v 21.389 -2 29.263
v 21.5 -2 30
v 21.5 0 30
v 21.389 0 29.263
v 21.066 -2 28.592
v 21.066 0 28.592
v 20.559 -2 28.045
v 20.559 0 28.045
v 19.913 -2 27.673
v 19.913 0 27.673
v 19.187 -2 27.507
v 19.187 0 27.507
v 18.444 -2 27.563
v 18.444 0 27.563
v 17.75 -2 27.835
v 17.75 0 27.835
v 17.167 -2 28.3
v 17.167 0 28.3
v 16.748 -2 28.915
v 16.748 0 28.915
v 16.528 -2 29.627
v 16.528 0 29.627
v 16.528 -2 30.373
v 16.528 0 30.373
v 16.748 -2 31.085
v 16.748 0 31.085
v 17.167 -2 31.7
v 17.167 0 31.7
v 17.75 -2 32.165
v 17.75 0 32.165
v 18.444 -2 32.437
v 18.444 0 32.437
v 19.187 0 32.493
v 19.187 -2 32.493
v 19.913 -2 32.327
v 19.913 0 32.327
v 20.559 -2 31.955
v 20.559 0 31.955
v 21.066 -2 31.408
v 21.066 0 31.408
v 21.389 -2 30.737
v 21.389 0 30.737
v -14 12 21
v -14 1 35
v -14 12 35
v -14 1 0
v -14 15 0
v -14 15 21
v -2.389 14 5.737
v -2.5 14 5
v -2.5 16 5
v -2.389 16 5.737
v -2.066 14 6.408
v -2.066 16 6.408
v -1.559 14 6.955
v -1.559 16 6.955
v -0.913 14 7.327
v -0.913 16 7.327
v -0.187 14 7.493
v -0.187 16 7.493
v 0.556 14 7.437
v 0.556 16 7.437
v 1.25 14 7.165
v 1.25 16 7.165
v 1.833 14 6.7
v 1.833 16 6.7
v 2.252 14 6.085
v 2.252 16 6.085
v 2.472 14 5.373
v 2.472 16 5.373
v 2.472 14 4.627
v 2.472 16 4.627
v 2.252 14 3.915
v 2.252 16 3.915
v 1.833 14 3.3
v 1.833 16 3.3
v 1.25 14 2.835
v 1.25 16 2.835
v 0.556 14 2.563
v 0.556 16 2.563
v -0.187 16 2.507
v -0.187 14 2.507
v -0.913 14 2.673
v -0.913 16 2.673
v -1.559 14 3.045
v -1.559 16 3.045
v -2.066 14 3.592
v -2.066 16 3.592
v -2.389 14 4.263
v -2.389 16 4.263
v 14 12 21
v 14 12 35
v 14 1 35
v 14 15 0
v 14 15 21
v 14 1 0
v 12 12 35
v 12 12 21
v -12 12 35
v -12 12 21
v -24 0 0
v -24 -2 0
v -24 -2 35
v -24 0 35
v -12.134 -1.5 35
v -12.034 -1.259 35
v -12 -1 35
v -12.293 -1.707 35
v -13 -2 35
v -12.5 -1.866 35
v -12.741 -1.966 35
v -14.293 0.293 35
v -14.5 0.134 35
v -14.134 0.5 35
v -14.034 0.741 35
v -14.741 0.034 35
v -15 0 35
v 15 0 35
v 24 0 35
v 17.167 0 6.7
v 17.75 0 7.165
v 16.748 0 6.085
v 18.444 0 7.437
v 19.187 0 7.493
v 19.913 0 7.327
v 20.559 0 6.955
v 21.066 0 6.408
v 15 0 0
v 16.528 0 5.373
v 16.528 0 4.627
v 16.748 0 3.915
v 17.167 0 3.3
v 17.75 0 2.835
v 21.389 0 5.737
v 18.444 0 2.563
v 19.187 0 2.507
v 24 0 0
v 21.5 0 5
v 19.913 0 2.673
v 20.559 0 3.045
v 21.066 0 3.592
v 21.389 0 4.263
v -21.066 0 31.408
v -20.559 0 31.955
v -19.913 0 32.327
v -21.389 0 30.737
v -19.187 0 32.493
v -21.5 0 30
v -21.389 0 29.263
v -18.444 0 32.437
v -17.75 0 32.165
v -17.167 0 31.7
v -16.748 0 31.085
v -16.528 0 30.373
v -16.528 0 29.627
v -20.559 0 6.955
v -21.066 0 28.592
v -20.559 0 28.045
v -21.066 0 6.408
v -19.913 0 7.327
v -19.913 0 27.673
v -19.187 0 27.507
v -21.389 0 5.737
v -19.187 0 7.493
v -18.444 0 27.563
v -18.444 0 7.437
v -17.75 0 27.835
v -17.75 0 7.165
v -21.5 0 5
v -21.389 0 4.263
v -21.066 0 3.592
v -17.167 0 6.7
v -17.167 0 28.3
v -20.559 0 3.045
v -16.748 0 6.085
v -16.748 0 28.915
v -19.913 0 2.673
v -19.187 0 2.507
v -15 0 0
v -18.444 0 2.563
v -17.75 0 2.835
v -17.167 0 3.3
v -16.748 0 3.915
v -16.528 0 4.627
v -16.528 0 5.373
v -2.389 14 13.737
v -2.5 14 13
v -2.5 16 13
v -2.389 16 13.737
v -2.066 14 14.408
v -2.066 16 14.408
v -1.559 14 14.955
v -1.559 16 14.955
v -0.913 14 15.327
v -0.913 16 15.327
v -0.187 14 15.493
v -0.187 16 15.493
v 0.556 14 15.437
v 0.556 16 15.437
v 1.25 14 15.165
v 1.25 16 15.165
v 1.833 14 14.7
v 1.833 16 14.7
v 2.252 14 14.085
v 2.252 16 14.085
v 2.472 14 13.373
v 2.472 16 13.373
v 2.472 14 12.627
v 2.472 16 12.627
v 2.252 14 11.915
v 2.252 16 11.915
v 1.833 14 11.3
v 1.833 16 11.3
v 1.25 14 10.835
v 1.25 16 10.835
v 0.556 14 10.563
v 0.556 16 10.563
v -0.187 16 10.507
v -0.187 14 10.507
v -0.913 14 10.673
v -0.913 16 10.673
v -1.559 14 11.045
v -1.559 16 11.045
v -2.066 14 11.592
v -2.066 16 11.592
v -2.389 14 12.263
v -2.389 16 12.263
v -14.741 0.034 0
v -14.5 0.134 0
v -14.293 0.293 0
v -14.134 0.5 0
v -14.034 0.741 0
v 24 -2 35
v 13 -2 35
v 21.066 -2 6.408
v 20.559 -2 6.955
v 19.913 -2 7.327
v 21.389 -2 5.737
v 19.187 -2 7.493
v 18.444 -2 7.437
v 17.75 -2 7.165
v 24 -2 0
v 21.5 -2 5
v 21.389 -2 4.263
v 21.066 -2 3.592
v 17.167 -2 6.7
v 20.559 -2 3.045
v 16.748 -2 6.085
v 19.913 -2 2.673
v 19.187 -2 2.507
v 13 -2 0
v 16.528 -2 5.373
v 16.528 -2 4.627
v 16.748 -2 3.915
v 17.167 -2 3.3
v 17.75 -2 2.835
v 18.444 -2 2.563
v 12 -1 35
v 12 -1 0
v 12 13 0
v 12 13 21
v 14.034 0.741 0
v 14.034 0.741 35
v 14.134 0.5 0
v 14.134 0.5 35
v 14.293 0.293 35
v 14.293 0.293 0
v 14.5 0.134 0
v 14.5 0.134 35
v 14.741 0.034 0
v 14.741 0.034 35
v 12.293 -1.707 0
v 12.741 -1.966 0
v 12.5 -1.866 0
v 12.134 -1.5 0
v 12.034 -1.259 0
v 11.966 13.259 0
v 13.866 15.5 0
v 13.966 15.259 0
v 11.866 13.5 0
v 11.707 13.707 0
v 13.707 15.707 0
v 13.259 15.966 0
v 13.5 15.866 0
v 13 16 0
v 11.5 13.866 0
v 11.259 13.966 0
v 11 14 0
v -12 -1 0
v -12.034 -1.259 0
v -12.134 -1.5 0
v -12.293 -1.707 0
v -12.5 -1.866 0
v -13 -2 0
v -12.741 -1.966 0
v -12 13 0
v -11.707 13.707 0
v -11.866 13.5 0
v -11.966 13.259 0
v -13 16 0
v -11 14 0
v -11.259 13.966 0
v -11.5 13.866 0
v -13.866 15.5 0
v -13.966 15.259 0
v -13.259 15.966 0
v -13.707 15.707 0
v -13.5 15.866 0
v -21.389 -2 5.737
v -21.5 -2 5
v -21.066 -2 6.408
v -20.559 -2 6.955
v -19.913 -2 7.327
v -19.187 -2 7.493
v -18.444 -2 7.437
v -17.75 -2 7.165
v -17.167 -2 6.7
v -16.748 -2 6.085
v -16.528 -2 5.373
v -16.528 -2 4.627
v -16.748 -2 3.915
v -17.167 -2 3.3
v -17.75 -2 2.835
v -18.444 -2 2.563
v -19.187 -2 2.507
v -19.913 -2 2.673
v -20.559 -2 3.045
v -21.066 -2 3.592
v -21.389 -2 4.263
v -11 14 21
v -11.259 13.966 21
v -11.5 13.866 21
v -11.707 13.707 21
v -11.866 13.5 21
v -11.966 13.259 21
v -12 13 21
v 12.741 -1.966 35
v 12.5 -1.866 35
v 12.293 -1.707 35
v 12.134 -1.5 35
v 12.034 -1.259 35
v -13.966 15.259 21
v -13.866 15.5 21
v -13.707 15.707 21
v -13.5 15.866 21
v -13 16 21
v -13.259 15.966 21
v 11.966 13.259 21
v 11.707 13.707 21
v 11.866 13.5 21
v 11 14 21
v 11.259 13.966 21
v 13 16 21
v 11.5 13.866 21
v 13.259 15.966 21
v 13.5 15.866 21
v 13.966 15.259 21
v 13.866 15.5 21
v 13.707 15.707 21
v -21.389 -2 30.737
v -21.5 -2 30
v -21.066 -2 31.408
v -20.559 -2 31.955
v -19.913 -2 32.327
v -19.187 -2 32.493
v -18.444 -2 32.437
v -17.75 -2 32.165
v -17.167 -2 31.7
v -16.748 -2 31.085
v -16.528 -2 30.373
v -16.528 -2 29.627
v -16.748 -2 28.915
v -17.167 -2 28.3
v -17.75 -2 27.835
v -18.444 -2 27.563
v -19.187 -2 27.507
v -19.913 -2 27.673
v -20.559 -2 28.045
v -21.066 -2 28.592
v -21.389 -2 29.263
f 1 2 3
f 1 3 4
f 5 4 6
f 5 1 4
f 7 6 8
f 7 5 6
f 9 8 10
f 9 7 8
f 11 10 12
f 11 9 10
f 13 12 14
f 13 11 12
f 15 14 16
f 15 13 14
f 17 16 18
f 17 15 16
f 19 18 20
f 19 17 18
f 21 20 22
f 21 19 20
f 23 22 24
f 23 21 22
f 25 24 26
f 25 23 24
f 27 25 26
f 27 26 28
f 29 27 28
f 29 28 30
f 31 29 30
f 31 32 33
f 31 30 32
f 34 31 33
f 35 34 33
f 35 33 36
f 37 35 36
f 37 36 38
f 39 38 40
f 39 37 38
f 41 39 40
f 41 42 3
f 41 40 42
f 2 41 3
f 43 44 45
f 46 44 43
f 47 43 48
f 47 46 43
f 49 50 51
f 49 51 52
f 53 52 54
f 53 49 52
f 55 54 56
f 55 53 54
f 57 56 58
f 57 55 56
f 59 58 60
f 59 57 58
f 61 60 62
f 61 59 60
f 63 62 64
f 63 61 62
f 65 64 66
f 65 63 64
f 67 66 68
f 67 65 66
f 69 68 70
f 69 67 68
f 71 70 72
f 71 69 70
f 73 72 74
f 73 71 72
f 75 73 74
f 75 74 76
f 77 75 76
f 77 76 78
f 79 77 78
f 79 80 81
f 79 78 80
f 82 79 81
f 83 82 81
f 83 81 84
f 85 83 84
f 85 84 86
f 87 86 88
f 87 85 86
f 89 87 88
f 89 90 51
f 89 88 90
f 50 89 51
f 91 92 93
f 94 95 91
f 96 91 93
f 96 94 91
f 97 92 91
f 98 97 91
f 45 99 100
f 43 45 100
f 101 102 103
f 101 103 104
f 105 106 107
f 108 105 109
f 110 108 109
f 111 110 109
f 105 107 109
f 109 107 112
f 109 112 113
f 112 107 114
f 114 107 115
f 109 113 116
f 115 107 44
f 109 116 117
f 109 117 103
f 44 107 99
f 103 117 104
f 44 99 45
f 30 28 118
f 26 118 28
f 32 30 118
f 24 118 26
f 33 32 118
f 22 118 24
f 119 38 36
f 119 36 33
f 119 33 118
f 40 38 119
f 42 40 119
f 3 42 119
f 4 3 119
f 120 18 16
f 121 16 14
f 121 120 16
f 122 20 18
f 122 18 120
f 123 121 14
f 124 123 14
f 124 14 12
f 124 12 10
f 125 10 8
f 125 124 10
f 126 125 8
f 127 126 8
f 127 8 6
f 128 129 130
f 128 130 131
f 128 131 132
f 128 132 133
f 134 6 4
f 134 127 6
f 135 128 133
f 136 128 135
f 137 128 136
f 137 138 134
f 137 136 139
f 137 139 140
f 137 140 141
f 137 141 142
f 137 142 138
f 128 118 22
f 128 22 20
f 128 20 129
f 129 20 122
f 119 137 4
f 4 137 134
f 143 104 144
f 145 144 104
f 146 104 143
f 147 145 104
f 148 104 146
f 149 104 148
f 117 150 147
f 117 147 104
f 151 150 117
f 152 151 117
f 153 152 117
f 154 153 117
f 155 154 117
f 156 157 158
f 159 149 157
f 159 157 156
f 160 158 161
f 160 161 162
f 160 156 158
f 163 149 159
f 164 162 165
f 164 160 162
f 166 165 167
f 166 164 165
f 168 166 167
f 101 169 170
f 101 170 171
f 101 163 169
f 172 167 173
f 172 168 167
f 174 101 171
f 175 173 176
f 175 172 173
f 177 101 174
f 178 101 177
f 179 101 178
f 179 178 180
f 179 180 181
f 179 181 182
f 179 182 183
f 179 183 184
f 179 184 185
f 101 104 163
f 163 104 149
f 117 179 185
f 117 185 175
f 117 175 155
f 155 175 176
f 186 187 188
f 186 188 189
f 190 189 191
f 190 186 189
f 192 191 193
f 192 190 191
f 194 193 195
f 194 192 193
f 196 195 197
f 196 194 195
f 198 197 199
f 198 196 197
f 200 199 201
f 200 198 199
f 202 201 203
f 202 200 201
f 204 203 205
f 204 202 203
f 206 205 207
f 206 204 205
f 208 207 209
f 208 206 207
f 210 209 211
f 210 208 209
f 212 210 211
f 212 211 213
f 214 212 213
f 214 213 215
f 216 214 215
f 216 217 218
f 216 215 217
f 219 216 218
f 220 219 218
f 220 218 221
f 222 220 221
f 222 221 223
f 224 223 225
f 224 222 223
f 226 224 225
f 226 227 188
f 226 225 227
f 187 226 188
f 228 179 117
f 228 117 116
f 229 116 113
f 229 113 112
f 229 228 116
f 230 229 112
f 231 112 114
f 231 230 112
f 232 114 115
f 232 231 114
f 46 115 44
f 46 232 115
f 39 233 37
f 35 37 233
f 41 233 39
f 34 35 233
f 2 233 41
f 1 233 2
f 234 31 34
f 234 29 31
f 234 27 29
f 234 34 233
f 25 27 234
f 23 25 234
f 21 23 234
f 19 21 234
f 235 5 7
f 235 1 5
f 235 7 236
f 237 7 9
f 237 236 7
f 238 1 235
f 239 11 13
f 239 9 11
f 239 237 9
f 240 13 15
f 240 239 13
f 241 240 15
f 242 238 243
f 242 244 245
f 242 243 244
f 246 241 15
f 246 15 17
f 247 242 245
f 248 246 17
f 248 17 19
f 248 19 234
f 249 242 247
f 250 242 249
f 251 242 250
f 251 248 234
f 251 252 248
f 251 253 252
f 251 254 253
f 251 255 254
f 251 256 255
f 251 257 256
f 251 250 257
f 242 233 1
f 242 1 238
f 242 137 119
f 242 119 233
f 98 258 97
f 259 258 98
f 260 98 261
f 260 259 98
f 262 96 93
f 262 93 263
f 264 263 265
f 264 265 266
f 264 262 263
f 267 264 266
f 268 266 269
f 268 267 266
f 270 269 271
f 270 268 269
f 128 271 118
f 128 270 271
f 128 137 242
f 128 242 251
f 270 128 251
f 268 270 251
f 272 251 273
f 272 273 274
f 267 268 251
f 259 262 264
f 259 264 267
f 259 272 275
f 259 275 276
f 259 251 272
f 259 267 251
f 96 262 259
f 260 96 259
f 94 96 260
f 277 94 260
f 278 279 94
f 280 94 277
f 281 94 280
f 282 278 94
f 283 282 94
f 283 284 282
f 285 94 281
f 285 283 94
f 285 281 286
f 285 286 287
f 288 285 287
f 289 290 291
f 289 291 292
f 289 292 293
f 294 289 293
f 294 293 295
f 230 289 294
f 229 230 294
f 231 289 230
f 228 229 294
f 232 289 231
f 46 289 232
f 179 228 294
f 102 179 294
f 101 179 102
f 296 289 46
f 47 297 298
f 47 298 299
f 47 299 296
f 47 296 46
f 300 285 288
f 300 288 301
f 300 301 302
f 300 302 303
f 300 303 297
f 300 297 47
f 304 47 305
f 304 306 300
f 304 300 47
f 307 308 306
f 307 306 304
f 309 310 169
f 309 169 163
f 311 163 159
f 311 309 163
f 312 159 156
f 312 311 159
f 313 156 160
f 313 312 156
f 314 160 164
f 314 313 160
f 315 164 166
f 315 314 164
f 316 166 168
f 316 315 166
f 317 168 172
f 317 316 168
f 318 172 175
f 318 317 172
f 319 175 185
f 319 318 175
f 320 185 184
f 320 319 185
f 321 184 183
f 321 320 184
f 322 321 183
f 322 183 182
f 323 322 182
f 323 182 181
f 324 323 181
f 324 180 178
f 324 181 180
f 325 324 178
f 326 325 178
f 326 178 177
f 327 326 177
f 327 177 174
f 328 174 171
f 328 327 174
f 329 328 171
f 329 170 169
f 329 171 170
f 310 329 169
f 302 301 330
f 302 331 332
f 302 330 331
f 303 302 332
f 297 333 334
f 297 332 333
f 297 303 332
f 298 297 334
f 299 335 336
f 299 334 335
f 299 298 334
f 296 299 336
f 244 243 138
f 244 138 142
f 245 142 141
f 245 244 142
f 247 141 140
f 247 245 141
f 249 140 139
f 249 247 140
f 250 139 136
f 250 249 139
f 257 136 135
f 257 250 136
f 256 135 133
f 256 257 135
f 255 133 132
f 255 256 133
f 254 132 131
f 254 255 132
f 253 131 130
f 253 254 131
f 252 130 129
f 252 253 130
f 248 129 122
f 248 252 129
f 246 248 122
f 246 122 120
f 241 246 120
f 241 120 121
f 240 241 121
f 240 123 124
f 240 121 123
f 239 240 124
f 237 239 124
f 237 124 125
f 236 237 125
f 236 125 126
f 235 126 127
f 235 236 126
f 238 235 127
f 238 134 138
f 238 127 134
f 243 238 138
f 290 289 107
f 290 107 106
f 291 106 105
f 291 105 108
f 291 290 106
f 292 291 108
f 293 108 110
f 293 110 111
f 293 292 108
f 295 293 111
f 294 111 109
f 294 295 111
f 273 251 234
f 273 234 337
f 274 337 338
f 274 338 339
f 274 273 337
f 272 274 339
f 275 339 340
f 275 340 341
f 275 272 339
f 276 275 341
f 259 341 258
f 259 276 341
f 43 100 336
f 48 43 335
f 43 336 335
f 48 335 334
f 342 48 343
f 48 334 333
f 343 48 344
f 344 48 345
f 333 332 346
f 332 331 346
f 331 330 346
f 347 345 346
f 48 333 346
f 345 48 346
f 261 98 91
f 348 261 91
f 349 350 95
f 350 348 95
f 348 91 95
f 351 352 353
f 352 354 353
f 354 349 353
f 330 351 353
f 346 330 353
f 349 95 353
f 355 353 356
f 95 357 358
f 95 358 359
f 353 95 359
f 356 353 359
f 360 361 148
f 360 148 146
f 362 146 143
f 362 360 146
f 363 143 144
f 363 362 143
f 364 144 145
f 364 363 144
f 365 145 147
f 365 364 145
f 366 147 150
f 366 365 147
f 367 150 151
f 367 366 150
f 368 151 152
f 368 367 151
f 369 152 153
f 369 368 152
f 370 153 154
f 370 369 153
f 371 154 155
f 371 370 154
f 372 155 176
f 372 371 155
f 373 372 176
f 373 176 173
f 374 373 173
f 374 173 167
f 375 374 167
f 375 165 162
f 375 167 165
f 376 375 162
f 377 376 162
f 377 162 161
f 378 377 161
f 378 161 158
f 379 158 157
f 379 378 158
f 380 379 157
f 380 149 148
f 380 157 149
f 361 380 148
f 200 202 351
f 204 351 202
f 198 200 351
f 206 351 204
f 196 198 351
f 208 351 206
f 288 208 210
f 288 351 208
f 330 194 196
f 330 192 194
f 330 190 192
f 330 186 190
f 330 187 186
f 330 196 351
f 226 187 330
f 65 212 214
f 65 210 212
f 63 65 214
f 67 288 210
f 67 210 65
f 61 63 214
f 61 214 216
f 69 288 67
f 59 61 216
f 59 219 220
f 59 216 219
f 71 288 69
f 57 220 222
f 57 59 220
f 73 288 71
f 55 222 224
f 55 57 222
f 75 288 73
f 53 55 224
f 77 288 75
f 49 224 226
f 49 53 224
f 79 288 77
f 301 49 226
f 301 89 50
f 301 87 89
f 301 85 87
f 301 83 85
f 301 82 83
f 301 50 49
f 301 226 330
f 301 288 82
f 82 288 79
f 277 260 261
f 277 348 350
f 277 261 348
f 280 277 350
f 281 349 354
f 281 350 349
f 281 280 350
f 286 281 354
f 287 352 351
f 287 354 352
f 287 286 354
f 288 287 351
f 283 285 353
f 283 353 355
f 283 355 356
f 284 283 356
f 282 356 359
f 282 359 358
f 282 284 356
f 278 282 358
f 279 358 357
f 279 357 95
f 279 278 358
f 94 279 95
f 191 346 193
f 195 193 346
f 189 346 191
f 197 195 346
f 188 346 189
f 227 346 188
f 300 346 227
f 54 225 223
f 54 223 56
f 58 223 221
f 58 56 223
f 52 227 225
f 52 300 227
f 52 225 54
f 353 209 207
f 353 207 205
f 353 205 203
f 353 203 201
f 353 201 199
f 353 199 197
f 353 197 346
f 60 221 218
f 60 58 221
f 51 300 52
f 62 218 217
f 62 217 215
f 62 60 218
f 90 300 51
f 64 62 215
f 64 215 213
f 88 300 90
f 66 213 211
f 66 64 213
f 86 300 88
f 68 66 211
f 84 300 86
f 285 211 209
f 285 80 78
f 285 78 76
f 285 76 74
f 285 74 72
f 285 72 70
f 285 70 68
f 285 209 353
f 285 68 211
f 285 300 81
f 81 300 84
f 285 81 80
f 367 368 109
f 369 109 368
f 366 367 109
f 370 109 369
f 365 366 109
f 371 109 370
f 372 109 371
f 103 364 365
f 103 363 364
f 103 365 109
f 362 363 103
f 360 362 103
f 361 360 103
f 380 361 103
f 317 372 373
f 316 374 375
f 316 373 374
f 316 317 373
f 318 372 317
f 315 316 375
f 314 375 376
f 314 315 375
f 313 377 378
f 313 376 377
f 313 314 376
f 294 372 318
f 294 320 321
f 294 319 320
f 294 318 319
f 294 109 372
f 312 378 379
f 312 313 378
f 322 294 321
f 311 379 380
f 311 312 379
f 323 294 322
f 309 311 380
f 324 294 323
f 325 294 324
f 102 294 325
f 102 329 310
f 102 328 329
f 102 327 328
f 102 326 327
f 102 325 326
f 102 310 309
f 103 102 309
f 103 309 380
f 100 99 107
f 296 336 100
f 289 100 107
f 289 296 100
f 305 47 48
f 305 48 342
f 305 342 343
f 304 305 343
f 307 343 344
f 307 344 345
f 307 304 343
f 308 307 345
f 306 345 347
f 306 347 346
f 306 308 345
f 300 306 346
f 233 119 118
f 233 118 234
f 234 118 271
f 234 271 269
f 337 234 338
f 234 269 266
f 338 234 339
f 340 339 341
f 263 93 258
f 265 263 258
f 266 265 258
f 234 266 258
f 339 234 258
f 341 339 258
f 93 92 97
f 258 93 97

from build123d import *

# Parameters (mm, degrees)
BOSS_EXTRUDE1_DEPTH     = 35
SKETCH2_W               = 14
SKETCH2_H               = 4
CUT_EXTRUDE1_DEPTH      = 55.083269132
CUT_EXTRUDE2_DEPTH      = 46.354161882
CUT_EXTRUDE2_DEPTH_BACK = 46.354161882
SKETCH3_R               = 2.5


with BuildPart() as part:
    # Sketch1 → Boss-Extrude1 (new body)
    with BuildSketch(Plane.XY):
        with BuildLine():
            Line((-24, 0), (-15, 0))
            ThreePointArc((-15, 0), (-14.292893219, 0.292893219), (-14, 1))
            Line((-14, 1), (-14, 15))
            ThreePointArc((-14, 15), (-13.707106781, 15.707106781), (-13, 16))
            Line((-13, 16), (13, 16))
            ThreePointArc((13, 16), (13.707106781, 15.707106781), (14, 15))
            Line((14, 15), (14, 1))
            ThreePointArc((14, 1), (14.292893219, 0.292893219), (15, 0))
            Line((15, 0), (24, 0))
            Line((24, 0), (24, -2))
            Line((24, -2), (13, -2))
            ThreePointArc((13, -2), (12.292893219, -1.707106781), (12, -1))
            Line((12, -1), (12, 13))
            ThreePointArc((12, 13), (11.707106781, 13.707106781), (11, 14))
            Line((11, 14), (-11, 14))
            ThreePointArc((-11, 14), (-11.707106781, 13.707106781), (-12, 13))
            Line((-12, 13), (-12, -1))
            ThreePointArc((-12, -1), (-12.292893219, -1.707106781), (-13, -2))
            Line((-13, -2), (-24, -2))
            Line((-24, -2), (-24, 0))
        make_face()
    extrude(amount=BOSS_EXTRUDE1_DEPTH)

    # Sketch2 → Cut-Extrude1 (cut, through all)
    with BuildSketch(Plane(origin=(14, 0, 0), x_dir=(0, 0, -1), z_dir=(1, 0, 0))):
        with Locations((-28, 14)):
            Rectangle(SKETCH2_W, SKETCH2_H)
    extrude(amount=-CUT_EXTRUDE1_DEPTH, mode=Mode.SUBTRACT)

    # Sketch3 → Cut-Extrude2 (cut, two sides: drawn at the far end of the back side and taken through both)
    with BuildSketch(Plane(origin=(0, 0, 0), x_dir=(1, 0, 0), z_dir=(0, 1, 0)).offset(-CUT_EXTRUDE2_DEPTH_BACK)):
        with Locations(Location((-19, -5, 0), (0, 0, 180))):
            Circle(SKETCH3_R)
        with Locations(Location((-19, -30, 0), (0, 0, 180))):
            Circle(SKETCH3_R)
        with Locations((19, -30)):
            Circle(SKETCH3_R)
        with Locations((19, -5)):
            Circle(SKETCH3_R)
        with Locations(Location((0, -13, 0), (0, 0, 180))):
            Circle(SKETCH3_R)
        with Locations(Location((0, -5, 0), (0, 0, 180))):
            Circle(SKETCH3_R)
    extrude(amount=CUT_EXTRUDE2_DEPTH + CUT_EXTRUDE2_DEPTH_BACK, mode=Mode.SUBTRACT)


solid = part.part
